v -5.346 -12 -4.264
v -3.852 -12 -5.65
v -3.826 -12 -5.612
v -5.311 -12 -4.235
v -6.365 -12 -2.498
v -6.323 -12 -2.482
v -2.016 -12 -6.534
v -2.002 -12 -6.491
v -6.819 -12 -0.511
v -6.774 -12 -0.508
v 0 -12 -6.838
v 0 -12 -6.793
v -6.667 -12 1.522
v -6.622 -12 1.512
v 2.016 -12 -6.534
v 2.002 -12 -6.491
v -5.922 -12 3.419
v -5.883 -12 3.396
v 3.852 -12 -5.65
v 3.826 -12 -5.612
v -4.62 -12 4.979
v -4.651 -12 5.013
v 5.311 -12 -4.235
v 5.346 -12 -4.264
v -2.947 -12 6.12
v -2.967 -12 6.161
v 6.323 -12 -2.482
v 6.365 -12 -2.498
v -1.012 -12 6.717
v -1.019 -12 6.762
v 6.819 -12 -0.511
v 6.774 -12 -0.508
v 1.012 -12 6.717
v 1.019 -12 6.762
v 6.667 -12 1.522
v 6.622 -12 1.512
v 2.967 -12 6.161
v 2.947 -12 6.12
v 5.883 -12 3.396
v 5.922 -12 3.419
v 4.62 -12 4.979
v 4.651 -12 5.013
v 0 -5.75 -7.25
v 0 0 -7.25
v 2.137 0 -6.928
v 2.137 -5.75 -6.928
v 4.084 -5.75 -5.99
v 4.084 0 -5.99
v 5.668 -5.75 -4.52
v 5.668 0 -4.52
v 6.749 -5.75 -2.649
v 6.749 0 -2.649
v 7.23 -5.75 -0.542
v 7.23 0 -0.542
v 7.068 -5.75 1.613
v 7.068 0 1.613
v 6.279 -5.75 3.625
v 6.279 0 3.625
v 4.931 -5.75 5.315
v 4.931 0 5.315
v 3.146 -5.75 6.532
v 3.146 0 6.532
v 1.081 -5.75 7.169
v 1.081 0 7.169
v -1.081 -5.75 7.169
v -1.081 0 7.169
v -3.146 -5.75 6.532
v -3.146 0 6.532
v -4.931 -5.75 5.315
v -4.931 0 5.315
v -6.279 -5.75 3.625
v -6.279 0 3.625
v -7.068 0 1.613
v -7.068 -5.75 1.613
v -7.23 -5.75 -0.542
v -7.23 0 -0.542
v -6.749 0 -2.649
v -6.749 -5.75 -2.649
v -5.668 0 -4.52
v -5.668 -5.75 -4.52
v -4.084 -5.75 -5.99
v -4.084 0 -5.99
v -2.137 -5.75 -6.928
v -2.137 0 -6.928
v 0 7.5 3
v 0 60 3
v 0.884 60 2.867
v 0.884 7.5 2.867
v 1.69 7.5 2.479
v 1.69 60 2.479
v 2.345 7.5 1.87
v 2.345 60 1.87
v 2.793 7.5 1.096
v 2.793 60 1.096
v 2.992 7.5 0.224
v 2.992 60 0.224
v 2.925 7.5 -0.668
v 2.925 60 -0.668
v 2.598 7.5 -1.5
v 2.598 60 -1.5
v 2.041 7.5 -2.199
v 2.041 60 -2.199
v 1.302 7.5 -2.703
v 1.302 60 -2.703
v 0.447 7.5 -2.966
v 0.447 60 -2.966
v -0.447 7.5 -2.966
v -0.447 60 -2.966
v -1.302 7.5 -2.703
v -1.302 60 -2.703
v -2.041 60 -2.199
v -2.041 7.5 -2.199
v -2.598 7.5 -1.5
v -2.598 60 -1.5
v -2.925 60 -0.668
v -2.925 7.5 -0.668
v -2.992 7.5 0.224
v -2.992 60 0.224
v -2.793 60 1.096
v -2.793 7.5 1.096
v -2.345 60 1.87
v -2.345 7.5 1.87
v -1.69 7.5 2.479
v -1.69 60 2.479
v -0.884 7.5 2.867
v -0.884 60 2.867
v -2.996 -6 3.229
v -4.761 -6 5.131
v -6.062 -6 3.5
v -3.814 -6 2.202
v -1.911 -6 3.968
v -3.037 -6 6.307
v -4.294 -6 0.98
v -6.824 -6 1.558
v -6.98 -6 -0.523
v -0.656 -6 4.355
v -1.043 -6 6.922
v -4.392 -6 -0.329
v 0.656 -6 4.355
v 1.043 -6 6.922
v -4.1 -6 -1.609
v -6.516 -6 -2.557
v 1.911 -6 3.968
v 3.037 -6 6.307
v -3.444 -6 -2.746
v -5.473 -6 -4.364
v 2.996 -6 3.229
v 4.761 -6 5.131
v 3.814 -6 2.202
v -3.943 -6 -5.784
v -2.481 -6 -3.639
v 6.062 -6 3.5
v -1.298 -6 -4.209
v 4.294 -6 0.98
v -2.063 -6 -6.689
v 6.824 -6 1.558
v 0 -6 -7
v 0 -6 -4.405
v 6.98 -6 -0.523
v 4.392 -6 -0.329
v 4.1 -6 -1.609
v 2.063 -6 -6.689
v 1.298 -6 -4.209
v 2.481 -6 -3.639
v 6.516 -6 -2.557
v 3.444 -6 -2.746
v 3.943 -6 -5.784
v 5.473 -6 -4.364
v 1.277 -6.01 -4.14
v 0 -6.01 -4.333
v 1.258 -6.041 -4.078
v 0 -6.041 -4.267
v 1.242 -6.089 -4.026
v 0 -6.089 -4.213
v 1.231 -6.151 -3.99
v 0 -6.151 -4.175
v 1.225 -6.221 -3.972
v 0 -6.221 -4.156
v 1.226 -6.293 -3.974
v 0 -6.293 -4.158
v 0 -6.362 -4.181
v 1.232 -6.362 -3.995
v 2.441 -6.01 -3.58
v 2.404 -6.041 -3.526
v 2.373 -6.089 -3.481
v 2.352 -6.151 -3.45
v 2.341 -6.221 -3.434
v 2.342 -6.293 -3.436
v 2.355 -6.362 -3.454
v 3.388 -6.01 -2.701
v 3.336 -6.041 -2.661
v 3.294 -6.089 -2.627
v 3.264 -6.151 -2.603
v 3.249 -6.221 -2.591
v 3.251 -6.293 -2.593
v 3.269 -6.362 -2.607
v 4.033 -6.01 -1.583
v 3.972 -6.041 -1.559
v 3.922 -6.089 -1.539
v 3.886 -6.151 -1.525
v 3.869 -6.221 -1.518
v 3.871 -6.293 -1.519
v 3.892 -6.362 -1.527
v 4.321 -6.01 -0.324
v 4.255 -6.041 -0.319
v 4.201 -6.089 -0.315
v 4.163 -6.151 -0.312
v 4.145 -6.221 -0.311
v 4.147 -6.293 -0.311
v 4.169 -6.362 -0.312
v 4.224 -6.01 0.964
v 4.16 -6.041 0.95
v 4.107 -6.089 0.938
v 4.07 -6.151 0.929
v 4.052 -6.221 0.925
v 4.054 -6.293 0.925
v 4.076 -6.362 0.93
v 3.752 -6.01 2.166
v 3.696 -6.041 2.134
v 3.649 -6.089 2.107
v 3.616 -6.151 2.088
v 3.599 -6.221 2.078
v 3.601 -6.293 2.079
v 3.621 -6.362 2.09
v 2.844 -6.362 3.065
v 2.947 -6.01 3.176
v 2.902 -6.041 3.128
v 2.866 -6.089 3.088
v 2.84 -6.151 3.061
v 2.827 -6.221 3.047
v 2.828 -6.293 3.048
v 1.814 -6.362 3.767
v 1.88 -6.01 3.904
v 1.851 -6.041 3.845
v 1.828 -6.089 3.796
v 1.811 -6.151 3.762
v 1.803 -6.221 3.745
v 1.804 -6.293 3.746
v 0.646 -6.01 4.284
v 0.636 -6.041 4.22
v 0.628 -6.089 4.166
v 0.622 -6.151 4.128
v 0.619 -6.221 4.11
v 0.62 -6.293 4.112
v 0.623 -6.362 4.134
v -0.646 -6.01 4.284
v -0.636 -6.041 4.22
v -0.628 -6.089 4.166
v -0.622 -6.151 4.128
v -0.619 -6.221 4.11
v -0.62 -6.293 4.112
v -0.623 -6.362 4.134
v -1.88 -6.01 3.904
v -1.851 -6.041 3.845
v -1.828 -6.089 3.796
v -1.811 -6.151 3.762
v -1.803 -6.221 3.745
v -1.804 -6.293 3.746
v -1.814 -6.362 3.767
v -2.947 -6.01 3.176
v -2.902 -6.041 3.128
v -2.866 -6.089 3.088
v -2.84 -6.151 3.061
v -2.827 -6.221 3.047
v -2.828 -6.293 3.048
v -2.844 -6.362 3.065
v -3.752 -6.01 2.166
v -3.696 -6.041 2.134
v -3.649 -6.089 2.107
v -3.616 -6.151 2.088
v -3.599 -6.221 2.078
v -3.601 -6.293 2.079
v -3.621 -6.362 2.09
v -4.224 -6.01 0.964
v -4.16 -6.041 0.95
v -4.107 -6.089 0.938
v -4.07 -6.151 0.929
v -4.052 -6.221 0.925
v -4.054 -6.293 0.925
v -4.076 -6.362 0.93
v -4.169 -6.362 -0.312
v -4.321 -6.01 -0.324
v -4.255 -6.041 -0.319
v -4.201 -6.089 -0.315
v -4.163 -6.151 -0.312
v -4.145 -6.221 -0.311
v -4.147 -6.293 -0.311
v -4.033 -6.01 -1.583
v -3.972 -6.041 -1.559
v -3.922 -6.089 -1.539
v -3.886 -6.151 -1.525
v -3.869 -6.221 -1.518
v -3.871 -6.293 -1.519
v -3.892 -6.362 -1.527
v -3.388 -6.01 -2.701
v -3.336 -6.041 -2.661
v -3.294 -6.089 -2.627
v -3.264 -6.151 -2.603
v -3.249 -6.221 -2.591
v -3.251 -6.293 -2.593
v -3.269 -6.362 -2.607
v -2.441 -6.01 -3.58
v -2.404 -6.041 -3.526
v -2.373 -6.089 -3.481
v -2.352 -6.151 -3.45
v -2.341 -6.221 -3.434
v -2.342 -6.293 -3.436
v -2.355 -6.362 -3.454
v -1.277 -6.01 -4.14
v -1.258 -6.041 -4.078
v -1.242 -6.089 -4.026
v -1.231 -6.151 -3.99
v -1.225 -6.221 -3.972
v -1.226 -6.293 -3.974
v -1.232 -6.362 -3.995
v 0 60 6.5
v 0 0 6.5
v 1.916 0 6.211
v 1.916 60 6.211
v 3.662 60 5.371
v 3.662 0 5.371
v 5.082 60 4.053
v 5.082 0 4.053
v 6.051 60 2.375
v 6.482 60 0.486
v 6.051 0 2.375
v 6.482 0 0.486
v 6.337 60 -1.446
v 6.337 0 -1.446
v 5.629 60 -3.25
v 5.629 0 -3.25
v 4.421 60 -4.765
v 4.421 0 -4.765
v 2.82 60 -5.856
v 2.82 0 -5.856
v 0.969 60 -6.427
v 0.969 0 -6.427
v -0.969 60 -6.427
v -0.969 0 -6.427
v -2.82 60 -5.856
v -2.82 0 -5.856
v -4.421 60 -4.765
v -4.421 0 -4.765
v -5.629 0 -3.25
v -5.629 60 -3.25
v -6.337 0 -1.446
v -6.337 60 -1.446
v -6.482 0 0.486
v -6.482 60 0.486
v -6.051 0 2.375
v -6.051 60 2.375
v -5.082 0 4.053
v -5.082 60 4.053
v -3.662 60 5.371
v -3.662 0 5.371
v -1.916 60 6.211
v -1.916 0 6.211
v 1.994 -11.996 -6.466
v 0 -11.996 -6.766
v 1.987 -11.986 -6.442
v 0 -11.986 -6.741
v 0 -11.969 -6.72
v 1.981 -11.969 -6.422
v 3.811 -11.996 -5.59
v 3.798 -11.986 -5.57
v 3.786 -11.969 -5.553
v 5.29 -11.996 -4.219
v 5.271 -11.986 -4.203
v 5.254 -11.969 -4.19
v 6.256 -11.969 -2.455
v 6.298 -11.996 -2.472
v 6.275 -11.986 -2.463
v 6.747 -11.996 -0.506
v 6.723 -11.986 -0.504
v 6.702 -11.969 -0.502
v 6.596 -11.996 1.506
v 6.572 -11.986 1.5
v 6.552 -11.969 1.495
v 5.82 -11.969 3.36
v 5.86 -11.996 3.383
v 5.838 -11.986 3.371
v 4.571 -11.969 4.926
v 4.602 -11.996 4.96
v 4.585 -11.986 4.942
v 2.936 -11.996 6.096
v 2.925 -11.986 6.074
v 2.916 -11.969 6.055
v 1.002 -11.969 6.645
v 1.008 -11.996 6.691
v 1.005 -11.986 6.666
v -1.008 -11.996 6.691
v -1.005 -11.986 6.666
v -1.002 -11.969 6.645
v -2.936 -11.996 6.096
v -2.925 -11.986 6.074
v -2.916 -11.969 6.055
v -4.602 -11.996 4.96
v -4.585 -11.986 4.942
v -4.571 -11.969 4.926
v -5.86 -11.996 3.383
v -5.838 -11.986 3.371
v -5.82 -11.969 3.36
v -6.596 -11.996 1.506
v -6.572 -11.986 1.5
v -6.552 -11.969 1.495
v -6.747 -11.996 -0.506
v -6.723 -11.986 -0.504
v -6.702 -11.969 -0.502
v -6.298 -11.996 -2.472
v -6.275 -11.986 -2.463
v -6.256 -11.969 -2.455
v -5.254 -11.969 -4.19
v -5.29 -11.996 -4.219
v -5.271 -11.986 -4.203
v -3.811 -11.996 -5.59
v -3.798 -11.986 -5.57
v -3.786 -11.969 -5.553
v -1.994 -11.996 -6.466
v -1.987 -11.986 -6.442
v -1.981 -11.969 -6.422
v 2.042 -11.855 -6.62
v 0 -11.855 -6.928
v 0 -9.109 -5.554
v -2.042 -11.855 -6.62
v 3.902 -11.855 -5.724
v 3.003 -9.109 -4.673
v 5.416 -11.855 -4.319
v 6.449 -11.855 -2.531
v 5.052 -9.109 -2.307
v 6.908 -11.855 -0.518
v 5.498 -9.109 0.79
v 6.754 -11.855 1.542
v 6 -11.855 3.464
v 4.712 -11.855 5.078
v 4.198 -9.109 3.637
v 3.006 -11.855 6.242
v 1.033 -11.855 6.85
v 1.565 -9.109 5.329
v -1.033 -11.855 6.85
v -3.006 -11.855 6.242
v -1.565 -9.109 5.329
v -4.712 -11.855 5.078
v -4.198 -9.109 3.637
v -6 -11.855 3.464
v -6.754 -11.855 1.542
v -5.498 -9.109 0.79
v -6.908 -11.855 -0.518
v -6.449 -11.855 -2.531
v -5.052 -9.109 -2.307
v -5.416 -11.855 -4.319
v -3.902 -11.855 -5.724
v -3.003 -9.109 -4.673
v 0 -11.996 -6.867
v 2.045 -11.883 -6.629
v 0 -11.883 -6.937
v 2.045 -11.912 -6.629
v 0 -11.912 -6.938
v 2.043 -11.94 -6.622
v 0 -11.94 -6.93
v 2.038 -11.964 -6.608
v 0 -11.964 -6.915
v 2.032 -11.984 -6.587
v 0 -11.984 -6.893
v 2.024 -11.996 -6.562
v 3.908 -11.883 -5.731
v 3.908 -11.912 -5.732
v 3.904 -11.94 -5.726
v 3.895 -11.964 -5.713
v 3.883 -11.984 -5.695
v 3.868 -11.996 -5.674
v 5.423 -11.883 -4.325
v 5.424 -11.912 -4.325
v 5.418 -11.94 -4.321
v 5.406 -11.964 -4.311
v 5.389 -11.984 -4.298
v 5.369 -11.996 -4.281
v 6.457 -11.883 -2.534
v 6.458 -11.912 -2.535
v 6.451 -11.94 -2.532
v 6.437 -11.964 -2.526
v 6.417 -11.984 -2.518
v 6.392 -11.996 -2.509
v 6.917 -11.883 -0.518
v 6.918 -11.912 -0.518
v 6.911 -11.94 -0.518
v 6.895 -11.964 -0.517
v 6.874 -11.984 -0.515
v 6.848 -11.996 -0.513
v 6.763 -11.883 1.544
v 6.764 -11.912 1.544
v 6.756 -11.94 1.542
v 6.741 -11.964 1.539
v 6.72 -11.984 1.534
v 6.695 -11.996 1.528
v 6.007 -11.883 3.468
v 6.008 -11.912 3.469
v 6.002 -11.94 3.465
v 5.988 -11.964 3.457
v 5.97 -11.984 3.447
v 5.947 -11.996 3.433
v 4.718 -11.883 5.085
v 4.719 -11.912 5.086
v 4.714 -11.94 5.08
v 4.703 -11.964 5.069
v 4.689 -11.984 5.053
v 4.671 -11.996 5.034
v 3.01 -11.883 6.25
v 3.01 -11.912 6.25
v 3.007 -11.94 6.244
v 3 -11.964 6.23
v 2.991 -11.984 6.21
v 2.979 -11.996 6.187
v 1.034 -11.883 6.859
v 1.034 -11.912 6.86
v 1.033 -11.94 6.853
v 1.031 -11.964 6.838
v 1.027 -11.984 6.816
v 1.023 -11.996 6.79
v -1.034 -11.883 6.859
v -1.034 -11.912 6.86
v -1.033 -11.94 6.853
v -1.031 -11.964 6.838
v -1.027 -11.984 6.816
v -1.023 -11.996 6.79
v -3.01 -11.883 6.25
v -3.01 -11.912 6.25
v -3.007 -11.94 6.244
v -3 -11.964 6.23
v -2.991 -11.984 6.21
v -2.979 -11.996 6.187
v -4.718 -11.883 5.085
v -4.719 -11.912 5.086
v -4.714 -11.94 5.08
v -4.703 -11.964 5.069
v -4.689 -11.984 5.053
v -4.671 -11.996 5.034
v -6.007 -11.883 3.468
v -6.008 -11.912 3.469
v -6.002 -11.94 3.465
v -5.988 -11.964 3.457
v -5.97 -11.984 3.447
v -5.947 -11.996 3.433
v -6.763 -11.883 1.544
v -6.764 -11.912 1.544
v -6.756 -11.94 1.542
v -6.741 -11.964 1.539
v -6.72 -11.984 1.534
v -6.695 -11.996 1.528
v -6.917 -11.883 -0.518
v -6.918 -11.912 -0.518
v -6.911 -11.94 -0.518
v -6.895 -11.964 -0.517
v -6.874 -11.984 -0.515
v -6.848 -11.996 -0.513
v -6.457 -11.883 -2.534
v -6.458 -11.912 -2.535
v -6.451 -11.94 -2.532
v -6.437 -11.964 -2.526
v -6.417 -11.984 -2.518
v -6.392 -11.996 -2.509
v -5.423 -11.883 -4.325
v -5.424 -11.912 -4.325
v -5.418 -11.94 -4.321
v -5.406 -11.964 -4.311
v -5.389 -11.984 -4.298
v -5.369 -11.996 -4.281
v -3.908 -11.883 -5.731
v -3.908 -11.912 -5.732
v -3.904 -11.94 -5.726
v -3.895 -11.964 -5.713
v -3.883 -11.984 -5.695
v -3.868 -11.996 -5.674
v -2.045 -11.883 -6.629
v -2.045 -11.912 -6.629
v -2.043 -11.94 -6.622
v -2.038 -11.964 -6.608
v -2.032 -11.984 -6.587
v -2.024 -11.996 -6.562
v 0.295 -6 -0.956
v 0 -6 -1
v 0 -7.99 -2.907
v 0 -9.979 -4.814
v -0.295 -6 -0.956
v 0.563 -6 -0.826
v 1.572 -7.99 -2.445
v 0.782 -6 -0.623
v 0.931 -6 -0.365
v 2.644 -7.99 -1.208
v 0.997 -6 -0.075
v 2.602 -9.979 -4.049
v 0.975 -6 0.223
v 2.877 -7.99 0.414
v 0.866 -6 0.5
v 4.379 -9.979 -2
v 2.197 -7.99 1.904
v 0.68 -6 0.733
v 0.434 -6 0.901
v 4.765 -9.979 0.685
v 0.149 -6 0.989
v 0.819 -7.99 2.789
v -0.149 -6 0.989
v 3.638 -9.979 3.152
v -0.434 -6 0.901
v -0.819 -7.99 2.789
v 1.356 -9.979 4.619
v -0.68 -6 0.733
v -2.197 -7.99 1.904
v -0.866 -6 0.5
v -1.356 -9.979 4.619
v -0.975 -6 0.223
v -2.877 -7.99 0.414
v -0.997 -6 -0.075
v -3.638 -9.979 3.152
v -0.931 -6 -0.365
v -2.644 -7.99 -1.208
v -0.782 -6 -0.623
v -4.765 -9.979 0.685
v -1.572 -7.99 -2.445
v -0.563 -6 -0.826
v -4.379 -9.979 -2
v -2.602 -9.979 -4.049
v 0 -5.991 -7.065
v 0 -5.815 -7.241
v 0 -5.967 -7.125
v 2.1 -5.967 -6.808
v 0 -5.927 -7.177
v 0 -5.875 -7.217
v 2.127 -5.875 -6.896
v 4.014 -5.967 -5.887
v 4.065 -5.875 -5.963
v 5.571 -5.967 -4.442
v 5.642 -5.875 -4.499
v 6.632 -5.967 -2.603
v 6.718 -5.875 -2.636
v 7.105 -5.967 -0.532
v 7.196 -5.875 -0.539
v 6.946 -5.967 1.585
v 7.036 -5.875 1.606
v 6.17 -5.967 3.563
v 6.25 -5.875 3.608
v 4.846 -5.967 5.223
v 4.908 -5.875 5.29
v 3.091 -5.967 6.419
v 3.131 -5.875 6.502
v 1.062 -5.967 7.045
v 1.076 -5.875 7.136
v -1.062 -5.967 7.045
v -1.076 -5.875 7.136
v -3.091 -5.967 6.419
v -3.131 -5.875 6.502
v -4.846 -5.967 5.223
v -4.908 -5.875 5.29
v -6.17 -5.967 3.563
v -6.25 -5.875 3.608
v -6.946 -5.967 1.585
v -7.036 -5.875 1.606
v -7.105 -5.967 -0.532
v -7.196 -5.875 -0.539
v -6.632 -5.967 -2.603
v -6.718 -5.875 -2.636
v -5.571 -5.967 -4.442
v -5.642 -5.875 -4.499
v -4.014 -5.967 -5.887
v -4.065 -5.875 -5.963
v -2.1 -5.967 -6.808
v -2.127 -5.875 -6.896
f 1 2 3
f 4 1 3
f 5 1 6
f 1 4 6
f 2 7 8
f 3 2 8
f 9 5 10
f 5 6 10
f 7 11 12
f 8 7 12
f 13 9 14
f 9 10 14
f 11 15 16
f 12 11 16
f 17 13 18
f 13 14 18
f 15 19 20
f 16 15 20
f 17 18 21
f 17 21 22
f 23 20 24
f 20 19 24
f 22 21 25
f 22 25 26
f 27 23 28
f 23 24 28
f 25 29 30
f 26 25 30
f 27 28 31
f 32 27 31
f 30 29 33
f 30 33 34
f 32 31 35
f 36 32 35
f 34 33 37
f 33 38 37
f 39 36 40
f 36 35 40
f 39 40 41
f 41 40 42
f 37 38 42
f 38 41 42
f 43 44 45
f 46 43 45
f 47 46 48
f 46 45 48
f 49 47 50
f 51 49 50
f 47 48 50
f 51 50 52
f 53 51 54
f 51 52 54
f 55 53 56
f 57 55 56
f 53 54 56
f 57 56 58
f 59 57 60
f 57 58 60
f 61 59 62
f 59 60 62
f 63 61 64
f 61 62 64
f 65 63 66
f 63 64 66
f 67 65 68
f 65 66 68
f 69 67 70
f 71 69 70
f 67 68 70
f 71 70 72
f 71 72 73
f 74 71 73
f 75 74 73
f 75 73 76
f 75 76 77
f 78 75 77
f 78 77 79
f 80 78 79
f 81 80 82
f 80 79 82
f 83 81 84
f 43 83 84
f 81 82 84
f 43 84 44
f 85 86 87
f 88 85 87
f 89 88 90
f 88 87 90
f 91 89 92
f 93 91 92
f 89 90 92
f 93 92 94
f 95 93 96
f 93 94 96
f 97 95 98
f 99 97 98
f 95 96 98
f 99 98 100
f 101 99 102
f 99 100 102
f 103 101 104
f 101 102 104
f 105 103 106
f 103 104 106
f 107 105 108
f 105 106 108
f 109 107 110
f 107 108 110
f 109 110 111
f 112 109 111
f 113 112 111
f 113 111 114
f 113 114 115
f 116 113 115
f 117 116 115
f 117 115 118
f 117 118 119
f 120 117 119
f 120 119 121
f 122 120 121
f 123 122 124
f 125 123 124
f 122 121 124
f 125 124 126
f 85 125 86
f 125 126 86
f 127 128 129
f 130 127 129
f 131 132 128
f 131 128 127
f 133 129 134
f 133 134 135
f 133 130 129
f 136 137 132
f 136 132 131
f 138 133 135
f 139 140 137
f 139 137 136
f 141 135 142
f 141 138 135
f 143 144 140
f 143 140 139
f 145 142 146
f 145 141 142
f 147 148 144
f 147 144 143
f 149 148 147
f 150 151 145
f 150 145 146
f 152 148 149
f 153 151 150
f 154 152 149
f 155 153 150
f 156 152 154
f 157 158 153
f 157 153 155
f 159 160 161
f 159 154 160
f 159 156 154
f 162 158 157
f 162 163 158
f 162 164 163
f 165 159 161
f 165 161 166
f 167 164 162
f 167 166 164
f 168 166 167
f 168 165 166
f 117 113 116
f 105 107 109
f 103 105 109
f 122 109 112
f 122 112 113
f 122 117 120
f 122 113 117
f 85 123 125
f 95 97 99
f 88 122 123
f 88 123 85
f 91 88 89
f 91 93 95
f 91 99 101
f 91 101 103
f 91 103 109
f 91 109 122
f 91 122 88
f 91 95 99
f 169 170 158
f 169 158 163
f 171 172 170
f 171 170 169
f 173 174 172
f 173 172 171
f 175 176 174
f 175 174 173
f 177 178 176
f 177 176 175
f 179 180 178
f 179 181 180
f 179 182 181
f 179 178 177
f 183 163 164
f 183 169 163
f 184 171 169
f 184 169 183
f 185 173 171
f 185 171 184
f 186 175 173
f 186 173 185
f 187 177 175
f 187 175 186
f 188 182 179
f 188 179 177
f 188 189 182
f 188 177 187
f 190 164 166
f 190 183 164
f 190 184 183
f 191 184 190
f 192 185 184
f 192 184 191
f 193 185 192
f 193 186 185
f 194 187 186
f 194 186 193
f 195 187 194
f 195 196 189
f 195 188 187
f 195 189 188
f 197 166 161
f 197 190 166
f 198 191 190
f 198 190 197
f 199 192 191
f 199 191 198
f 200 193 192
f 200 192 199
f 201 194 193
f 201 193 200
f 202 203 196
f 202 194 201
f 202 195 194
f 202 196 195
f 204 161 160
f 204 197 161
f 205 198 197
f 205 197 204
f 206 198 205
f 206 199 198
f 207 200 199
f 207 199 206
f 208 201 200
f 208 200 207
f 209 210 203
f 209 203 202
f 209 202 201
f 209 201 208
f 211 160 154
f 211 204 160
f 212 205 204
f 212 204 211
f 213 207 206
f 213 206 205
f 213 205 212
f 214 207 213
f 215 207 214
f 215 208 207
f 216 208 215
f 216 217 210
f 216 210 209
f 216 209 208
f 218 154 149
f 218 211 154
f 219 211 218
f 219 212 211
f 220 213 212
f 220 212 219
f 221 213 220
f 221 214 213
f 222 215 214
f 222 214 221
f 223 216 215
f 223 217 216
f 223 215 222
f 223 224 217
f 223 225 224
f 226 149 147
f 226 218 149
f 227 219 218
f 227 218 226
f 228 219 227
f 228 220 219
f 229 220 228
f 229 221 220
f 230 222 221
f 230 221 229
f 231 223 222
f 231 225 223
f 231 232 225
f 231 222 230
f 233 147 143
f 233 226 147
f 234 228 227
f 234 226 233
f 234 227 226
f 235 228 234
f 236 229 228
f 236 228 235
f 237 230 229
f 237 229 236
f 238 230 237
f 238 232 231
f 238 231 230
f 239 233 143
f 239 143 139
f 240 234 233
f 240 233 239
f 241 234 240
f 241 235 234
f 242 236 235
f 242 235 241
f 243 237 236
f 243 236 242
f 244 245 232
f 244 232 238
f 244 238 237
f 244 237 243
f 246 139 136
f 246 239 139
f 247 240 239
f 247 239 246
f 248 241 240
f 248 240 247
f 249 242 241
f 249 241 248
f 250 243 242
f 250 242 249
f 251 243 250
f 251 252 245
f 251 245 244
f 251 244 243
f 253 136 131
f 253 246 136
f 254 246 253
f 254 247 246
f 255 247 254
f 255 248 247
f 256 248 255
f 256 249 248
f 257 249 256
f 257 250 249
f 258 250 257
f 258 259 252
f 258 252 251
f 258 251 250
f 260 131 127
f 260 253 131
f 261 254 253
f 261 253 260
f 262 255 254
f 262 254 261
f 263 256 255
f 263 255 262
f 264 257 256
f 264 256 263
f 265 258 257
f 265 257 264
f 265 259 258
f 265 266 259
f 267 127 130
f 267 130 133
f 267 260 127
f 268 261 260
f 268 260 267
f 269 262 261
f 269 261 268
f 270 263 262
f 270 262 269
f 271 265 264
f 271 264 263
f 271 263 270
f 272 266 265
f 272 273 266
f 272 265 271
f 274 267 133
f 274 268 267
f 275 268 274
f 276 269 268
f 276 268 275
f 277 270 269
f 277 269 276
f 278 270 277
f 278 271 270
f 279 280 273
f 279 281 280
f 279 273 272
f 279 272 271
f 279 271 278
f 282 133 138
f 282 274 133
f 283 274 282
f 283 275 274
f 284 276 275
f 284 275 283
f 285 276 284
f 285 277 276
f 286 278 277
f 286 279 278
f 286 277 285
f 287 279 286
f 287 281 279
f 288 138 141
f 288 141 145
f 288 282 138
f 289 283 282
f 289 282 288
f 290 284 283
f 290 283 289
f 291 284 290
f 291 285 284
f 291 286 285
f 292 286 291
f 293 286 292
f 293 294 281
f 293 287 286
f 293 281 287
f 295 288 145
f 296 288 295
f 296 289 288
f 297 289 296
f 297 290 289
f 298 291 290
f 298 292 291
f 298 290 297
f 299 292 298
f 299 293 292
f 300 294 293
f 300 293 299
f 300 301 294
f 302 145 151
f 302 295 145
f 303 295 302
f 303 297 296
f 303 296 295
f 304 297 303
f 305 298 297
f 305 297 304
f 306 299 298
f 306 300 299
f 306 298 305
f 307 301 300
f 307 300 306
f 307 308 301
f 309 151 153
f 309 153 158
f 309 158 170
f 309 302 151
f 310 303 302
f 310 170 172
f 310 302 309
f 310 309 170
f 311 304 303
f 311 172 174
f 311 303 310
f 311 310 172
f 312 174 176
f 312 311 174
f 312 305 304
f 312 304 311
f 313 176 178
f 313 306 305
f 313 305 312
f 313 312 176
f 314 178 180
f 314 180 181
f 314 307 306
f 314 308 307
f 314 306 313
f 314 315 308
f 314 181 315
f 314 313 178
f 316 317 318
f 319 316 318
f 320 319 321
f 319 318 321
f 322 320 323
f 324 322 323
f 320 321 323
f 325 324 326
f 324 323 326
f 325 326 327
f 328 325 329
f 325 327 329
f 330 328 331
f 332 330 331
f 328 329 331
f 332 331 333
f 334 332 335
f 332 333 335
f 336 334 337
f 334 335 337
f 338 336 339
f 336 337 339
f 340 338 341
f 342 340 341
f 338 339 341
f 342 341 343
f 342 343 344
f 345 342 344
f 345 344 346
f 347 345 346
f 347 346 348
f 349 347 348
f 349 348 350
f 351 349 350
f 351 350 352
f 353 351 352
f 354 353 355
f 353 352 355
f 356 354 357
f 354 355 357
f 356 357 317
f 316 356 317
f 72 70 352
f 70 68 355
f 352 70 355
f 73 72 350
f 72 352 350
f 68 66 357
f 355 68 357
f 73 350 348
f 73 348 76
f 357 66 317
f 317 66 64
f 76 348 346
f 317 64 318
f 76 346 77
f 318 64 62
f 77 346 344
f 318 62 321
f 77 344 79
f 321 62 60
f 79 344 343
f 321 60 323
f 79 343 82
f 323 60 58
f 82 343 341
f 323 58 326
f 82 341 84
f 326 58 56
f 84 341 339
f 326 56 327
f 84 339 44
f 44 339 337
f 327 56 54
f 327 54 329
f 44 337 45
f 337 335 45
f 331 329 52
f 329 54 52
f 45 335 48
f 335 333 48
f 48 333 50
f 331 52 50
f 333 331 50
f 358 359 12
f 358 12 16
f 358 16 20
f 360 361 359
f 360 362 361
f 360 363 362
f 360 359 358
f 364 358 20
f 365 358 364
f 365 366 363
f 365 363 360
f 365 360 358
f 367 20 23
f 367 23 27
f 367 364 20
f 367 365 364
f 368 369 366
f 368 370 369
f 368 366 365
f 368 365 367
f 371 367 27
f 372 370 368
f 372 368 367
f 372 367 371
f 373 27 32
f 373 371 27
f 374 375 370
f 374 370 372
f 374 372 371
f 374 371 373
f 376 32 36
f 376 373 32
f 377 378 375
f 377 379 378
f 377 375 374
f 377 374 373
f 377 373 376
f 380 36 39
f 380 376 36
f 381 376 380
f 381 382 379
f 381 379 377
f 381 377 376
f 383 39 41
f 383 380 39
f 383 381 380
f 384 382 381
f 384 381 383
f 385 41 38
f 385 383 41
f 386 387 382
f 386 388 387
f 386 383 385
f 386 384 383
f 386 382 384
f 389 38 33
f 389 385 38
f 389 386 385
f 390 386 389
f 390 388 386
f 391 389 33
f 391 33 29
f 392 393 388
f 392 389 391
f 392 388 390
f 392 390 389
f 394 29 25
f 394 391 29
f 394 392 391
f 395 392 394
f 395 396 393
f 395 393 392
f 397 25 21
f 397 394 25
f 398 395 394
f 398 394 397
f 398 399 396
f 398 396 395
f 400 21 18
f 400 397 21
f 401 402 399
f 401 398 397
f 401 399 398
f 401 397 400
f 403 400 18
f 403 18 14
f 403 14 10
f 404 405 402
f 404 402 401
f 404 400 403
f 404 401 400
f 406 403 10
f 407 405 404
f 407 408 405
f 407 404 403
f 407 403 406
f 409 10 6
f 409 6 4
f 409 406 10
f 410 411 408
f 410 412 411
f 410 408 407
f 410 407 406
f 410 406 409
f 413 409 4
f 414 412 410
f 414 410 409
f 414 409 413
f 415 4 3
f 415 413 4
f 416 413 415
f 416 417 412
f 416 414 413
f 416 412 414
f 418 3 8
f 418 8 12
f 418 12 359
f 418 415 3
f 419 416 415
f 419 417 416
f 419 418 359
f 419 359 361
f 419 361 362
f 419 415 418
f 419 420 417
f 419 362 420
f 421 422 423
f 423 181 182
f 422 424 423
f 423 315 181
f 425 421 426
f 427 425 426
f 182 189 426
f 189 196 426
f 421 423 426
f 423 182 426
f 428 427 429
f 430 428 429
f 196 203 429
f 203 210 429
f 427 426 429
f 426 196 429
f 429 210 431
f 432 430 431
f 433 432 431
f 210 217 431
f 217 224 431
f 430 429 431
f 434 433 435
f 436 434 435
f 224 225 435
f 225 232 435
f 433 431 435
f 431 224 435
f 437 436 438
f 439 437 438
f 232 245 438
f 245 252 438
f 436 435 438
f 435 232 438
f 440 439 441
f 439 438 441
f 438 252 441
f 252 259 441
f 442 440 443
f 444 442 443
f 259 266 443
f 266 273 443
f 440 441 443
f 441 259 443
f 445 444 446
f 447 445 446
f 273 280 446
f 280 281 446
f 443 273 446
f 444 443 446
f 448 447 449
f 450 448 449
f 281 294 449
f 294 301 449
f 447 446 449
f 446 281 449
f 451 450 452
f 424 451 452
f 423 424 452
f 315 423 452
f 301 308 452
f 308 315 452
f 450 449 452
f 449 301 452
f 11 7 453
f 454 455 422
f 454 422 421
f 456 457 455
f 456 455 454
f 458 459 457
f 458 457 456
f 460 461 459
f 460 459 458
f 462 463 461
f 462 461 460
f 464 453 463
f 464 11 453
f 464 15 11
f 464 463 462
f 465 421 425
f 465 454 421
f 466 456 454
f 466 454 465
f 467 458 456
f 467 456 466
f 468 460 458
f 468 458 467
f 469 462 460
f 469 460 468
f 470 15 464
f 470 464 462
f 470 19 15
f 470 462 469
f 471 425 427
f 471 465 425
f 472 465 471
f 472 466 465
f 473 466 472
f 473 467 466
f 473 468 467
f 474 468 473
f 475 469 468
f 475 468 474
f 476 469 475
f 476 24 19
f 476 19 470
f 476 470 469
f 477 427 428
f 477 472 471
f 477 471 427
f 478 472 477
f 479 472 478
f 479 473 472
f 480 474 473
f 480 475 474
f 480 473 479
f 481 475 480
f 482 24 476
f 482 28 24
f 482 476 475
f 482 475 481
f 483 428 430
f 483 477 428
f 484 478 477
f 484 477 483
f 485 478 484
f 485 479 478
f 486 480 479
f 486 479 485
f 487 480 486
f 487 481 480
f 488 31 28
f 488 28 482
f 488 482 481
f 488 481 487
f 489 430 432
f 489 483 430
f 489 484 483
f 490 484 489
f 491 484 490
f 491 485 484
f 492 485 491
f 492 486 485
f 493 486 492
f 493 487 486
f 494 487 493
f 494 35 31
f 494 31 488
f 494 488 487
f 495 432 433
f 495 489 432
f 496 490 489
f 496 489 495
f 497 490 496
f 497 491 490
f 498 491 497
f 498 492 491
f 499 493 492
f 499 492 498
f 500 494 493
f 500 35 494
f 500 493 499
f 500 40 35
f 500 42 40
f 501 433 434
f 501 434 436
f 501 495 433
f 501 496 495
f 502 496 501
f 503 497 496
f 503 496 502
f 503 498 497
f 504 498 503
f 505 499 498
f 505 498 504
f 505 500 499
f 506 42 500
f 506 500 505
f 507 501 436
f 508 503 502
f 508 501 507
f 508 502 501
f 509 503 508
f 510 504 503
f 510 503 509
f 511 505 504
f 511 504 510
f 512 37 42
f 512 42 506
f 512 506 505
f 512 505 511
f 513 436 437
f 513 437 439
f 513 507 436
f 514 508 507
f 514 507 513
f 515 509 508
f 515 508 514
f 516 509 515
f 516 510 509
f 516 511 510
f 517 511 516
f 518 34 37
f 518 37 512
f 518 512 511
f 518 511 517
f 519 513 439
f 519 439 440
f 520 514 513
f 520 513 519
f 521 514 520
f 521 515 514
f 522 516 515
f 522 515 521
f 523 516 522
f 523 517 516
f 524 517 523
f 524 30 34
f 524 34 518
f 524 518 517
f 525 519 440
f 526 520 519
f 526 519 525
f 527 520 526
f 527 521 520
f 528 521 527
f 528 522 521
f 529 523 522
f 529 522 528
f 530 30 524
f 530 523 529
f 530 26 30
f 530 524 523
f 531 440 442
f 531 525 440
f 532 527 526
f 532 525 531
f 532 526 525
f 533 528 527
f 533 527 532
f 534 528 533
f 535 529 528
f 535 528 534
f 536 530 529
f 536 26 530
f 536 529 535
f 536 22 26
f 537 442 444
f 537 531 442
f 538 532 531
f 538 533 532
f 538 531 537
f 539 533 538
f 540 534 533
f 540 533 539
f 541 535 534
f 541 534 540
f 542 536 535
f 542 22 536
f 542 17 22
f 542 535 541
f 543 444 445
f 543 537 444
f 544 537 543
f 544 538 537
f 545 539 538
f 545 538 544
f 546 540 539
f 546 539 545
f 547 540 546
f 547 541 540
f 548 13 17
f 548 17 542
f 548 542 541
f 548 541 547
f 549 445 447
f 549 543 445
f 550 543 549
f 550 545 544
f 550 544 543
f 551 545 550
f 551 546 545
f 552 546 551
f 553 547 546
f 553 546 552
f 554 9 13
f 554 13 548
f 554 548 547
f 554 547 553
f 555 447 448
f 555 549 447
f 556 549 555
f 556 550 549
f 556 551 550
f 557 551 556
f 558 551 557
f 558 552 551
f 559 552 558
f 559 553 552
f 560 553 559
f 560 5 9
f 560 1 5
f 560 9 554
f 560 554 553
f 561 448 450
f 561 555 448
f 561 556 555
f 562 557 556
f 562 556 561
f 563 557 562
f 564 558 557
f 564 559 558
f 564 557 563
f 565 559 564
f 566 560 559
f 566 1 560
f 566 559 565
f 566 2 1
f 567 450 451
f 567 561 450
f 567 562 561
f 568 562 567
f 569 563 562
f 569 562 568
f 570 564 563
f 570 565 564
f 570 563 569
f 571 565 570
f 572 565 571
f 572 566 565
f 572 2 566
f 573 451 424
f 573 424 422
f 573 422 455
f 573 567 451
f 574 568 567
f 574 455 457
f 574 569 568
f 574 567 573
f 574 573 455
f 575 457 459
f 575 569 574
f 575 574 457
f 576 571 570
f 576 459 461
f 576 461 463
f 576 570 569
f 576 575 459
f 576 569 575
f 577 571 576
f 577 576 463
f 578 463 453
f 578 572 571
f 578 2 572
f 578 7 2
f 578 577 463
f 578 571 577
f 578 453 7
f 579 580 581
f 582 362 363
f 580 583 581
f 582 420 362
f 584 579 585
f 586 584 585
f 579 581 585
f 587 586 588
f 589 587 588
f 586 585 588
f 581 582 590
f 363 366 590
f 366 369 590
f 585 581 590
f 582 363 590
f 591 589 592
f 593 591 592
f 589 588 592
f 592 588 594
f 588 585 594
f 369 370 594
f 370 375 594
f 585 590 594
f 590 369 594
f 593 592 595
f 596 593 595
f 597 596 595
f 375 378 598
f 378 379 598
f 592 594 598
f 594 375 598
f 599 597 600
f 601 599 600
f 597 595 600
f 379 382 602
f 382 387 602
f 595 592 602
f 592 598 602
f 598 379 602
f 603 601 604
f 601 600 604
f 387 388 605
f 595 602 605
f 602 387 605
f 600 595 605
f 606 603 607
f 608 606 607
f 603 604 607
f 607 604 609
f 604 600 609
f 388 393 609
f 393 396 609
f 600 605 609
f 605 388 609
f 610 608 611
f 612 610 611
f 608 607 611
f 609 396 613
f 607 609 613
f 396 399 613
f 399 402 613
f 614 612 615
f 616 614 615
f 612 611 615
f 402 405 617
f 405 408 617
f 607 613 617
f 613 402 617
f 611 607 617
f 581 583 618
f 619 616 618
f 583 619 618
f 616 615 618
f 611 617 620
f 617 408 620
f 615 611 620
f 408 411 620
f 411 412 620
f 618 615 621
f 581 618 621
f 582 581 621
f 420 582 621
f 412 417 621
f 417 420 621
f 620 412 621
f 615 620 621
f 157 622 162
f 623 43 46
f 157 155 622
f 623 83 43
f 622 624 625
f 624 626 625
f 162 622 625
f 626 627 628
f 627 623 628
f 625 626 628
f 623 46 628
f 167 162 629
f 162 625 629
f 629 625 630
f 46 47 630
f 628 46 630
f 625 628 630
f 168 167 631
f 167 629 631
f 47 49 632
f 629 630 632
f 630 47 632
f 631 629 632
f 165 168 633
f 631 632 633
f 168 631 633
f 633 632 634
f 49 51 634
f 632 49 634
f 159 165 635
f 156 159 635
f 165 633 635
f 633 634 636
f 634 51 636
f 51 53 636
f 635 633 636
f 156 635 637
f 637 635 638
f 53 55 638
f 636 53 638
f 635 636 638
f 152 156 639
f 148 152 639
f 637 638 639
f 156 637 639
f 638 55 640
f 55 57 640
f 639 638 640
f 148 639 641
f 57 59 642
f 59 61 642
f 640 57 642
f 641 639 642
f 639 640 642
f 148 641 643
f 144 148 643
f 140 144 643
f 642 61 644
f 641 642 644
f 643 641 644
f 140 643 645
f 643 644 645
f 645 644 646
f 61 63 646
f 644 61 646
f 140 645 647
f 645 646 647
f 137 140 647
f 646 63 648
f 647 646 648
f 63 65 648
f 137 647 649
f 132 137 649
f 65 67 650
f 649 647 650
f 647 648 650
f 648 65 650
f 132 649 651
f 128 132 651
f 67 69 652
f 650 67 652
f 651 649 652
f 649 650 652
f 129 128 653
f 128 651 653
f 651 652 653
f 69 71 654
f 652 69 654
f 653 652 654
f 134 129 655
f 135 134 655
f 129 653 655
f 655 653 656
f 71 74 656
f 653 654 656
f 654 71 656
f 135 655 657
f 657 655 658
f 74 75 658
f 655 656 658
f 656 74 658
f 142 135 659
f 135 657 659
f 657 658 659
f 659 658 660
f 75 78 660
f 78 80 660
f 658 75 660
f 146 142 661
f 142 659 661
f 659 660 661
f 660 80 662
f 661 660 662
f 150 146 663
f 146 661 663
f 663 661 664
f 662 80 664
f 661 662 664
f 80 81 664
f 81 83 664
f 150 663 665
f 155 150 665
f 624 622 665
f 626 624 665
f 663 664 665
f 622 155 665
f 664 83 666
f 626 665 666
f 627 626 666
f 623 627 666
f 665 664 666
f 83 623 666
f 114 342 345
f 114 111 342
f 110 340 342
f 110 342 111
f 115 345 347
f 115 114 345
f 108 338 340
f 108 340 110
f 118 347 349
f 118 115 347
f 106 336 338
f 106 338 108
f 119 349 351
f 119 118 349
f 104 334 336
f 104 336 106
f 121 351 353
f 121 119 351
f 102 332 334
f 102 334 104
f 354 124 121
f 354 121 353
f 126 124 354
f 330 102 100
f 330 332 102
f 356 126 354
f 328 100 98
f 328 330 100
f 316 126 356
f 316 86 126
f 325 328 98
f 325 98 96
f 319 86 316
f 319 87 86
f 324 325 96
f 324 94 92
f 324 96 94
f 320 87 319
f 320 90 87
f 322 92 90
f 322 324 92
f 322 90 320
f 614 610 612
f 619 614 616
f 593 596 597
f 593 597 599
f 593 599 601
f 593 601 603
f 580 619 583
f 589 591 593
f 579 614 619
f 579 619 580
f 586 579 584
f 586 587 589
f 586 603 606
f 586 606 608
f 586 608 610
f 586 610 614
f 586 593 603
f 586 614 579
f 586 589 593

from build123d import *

# Parameters (mm, degrees)
SKETCH1_R           = 6.5
BOSS_EXTRUDE1_DEPTH = 60
SKETCH2_R           = 3
INNER_CHAMBER_DEPTH = 52.5
SKETCH4_R           = 7.25
BOSS_EXTRUDE2_DEPTH = 6
FILLET4_R           = 0.1
FILLET5_R           = 0.25
FILLET6_R           = 0.25


with BuildPart() as part:
    # Sketch1 → Boss-Extrude1 (new body)
    with BuildSketch(Plane(origin=(0, 0, 0), x_dir=(1, 0, 0), z_dir=(0, 1, 0))):
        with Locations(Location((0, 0, 0), (0, 0, 270))):
            Circle(SKETCH1_R)
    extrude(amount=BOSS_EXTRUDE1_DEPTH)

    # Sketch2 → Inner Chamber (cut)
    with BuildSketch(Plane(origin=(0, 60, 0), x_dir=(1, 0, 0), z_dir=(0, 1, 0))):
        with Locations(Location((0, 0, 0), (0, 0, 270))):
            Circle(SKETCH2_R)
    extrude(amount=-INNER_CHAMBER_DEPTH, mode=Mode.SUBTRACT)

    # Sketch4 → Boss-Extrude2 (add)
    with BuildSketch(Plane.XZ):
        with Locations(Location((0, 0, 0), (0, 0, 270))):
            Circle(SKETCH4_R)
    extrude(amount=BOSS_EXTRUDE2_DEPTH)

    # Sketch6 → Revolve1 (revolve)
    with BuildSketch(Plane(origin=(0, 0, 0), x_dir=(0, 0, -1), z_dir=(1, 0, 0))):
        Polygon((1, -6), (6.75, -12), (7, -12), (4, -6), align=None)
    revolve(axis=Axis((0, -6, 0), (0, -1, 0)))

    # Fillet4
    fillet4_edges = [part.edges().sort_by_distance(p)[0] for p in [
        (0, -12, 7),
        (0, -12, 6.75),
    ]]
    fillet(fillet4_edges, radius=FILLET4_R)

    # Fillet5
    fillet5_edges = [part.edges().sort_by_distance(p)[0] for p in [
        (0, -6, 7.25),
    ]]
    fillet(fillet5_edges, radius=FILLET5_R)

    # Fillet6
    fillet6_edges = [part.edges().sort_by_distance(p)[0] for p in [
        (0, -6, 4),
    ]]
    fillet(fillet6_edges, radius=FILLET6_R)


solid = part.part
